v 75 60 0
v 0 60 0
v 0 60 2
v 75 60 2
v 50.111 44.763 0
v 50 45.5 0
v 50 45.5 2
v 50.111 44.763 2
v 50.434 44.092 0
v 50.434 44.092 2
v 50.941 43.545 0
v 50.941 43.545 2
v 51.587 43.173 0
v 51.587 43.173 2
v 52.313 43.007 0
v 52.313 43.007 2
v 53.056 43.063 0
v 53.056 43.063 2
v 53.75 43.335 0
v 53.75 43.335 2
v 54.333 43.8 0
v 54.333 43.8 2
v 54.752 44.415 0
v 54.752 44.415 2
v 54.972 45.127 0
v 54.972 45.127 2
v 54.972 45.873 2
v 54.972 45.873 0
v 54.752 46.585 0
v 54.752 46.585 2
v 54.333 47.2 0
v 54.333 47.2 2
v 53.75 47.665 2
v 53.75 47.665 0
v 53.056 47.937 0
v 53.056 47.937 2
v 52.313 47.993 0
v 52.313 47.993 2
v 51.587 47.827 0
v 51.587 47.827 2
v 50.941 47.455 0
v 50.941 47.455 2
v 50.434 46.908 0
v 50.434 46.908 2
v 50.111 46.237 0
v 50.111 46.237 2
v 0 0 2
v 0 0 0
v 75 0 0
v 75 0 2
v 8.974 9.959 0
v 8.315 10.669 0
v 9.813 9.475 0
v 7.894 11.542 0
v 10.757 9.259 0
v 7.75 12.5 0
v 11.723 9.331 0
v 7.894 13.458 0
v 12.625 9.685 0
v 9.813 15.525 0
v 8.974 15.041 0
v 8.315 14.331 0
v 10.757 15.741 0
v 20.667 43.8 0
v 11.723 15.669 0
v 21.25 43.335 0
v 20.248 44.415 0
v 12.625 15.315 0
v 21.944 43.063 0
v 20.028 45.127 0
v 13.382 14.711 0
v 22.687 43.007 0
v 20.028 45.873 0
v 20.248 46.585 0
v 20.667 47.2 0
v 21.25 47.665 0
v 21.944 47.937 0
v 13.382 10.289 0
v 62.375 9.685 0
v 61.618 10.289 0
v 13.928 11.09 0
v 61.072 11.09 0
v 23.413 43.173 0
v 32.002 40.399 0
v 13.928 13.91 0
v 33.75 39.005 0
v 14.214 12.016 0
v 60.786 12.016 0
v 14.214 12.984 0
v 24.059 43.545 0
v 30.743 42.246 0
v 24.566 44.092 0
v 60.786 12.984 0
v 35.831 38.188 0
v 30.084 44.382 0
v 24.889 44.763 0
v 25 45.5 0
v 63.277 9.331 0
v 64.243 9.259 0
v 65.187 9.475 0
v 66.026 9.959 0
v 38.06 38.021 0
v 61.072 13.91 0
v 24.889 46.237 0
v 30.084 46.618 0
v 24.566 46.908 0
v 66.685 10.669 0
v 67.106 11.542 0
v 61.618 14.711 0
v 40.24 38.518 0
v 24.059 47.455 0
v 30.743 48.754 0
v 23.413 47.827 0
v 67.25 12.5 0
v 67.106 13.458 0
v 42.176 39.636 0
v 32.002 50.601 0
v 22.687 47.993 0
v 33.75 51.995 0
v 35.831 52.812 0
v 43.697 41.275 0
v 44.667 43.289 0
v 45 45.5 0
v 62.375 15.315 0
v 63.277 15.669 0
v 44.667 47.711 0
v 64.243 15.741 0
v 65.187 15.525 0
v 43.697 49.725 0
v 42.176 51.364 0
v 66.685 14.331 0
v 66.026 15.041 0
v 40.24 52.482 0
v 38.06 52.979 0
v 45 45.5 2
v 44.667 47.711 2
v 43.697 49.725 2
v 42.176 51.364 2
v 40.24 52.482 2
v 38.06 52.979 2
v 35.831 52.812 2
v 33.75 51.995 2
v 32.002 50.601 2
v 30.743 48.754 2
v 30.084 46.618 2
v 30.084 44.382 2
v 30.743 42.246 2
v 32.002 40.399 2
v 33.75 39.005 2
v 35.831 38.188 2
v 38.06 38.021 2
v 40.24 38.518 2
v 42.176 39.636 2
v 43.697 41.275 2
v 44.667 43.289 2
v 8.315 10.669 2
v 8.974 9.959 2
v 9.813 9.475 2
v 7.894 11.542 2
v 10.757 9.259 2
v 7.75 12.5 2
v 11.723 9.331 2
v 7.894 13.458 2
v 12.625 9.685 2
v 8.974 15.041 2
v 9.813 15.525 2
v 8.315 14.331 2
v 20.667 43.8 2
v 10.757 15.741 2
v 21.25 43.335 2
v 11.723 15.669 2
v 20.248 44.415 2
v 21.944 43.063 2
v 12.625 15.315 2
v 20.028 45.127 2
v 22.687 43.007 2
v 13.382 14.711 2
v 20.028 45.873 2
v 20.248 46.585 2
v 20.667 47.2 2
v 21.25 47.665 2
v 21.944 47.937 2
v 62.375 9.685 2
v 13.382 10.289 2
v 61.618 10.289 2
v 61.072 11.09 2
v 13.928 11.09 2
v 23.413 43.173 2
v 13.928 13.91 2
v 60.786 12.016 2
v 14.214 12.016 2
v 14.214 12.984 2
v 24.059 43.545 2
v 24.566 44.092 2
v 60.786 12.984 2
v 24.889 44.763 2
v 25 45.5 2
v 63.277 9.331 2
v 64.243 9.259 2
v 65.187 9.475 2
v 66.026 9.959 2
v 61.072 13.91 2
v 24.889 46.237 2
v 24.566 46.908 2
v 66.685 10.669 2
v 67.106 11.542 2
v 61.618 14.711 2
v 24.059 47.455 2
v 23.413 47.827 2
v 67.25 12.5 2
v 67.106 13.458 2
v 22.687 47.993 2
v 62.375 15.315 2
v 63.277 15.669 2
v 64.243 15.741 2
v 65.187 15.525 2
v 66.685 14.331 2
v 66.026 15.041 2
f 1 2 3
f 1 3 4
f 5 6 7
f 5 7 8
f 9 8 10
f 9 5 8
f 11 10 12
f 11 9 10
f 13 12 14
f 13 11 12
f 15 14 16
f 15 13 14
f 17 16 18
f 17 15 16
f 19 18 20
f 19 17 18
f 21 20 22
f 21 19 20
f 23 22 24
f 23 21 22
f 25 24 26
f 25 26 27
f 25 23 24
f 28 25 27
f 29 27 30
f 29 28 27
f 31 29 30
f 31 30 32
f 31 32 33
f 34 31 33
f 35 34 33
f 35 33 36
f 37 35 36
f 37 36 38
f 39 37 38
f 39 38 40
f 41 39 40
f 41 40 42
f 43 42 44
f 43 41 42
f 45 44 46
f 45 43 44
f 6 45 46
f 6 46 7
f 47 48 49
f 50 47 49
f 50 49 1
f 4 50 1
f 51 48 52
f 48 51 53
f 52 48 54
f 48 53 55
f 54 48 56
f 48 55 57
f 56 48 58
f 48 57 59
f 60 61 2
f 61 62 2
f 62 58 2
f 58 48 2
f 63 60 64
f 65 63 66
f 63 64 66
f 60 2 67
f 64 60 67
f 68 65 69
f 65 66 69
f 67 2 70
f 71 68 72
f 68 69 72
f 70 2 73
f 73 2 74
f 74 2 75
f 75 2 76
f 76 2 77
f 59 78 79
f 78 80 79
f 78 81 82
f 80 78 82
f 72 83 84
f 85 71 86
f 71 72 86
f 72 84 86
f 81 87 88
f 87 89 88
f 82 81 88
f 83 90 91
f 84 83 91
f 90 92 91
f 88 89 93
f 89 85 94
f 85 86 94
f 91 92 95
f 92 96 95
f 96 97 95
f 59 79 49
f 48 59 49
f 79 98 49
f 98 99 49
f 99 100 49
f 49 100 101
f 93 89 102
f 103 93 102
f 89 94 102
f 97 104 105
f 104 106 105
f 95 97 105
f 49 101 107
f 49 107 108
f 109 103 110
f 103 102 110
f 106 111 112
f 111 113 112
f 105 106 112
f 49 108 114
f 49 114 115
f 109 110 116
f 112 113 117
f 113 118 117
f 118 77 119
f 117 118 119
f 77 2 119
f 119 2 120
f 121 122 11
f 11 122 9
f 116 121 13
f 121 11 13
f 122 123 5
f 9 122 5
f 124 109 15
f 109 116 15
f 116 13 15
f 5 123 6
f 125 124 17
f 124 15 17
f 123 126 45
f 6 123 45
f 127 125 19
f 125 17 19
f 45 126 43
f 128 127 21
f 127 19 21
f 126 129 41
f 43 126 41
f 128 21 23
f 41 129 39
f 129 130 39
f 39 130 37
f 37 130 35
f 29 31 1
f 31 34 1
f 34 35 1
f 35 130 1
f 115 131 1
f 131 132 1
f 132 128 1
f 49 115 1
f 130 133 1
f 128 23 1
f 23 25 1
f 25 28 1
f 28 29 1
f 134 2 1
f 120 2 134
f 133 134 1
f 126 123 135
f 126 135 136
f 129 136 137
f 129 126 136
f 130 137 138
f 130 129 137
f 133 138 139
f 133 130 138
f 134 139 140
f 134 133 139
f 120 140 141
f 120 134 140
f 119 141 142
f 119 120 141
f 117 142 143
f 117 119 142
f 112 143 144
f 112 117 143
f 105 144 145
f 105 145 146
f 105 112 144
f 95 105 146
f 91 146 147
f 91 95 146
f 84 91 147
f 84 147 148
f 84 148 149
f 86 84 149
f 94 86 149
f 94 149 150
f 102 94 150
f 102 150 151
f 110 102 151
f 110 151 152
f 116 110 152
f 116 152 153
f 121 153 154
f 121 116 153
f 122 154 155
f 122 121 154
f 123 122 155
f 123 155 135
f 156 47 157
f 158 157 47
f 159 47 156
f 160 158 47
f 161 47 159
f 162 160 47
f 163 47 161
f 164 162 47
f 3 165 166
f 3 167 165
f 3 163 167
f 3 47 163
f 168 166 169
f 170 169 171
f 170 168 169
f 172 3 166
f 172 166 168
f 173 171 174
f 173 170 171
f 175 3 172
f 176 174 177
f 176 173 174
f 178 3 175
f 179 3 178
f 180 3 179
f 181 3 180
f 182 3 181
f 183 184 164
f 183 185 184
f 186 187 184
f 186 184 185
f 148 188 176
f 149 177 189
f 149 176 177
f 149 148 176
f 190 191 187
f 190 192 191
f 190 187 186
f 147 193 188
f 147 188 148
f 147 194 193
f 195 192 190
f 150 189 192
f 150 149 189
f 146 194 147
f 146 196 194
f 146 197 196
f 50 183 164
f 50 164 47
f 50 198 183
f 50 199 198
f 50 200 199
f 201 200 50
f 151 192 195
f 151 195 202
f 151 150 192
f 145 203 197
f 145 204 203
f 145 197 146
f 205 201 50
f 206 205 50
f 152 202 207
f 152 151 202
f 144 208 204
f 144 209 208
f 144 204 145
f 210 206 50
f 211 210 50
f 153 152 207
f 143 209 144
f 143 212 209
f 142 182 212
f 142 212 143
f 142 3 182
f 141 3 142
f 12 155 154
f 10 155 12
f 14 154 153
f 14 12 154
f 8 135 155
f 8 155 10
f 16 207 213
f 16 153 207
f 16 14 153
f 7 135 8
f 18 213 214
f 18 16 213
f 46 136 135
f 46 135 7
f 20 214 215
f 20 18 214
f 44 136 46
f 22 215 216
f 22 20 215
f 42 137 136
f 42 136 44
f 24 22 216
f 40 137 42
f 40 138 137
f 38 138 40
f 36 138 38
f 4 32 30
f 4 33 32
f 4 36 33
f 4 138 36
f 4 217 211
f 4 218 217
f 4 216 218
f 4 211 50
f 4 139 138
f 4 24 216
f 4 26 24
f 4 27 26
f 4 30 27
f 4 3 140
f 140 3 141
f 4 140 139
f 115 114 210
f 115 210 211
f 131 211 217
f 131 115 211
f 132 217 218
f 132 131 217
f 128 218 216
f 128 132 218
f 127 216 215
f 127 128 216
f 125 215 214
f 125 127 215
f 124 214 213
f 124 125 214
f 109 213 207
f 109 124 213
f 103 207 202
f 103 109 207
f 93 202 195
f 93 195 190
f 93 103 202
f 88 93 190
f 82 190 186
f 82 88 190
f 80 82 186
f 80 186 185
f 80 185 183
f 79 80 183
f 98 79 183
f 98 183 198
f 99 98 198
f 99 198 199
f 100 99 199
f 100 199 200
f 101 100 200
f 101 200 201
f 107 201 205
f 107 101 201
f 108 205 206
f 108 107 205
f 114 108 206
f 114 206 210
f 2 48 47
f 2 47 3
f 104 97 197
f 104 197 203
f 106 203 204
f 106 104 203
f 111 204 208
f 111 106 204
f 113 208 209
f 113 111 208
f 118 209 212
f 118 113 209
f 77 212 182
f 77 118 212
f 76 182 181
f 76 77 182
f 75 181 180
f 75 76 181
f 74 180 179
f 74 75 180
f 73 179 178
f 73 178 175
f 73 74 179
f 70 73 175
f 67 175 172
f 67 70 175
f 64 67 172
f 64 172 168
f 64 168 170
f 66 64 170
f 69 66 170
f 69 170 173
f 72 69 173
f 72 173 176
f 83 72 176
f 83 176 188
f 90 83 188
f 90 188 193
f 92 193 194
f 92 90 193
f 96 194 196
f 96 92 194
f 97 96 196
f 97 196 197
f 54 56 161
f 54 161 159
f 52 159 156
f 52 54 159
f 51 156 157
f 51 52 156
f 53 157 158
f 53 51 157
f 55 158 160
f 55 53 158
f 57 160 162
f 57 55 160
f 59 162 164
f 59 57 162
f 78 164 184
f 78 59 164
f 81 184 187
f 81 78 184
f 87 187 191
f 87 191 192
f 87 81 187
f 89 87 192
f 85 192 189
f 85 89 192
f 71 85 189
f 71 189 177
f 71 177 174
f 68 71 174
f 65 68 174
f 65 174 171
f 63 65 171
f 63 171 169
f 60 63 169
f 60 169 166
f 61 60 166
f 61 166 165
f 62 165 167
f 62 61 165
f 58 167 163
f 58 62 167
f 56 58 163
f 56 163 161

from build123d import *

# Parameters (mm, degrees)
SKETCH2_W           = 75
SKETCH2_H           = 60
SKETCH2_R           = 7.5
SKETCH2_R_2         = 3.25
SKETCH2_R_3         = 2.5
BOSS_EXTRUDE1_DEPTH = 2


with BuildPart() as part:
    # Sketch2 → Boss-Extrude1 (new body)
    with BuildSketch(Plane.XY):
        with Locations((37.5, 30)):
            Rectangle(SKETCH2_W, SKETCH2_H)
        with Locations((37.5, 45.5)):
            Circle(SKETCH2_R, mode=Mode.SUBTRACT)
        with Locations((64, 12.5)):
            Circle(SKETCH2_R_2, mode=Mode.SUBTRACT)
        with Locations(Location((11, 12.5, 0), (0, 0, 180))):
            Circle(SKETCH2_R_2, mode=Mode.SUBTRACT)
        with Locations((22.5, 45.5)):
            Circle(SKETCH2_R_3, mode=Mode.SUBTRACT)
        with Locations(Location((52.5, 45.5, 0), (0, 0, 180))):
            Circle(SKETCH2_R_3, mode=Mode.SUBTRACT)
    extrude(amount=BOSS_EXTRUDE1_DEPTH)


solid = part.part
